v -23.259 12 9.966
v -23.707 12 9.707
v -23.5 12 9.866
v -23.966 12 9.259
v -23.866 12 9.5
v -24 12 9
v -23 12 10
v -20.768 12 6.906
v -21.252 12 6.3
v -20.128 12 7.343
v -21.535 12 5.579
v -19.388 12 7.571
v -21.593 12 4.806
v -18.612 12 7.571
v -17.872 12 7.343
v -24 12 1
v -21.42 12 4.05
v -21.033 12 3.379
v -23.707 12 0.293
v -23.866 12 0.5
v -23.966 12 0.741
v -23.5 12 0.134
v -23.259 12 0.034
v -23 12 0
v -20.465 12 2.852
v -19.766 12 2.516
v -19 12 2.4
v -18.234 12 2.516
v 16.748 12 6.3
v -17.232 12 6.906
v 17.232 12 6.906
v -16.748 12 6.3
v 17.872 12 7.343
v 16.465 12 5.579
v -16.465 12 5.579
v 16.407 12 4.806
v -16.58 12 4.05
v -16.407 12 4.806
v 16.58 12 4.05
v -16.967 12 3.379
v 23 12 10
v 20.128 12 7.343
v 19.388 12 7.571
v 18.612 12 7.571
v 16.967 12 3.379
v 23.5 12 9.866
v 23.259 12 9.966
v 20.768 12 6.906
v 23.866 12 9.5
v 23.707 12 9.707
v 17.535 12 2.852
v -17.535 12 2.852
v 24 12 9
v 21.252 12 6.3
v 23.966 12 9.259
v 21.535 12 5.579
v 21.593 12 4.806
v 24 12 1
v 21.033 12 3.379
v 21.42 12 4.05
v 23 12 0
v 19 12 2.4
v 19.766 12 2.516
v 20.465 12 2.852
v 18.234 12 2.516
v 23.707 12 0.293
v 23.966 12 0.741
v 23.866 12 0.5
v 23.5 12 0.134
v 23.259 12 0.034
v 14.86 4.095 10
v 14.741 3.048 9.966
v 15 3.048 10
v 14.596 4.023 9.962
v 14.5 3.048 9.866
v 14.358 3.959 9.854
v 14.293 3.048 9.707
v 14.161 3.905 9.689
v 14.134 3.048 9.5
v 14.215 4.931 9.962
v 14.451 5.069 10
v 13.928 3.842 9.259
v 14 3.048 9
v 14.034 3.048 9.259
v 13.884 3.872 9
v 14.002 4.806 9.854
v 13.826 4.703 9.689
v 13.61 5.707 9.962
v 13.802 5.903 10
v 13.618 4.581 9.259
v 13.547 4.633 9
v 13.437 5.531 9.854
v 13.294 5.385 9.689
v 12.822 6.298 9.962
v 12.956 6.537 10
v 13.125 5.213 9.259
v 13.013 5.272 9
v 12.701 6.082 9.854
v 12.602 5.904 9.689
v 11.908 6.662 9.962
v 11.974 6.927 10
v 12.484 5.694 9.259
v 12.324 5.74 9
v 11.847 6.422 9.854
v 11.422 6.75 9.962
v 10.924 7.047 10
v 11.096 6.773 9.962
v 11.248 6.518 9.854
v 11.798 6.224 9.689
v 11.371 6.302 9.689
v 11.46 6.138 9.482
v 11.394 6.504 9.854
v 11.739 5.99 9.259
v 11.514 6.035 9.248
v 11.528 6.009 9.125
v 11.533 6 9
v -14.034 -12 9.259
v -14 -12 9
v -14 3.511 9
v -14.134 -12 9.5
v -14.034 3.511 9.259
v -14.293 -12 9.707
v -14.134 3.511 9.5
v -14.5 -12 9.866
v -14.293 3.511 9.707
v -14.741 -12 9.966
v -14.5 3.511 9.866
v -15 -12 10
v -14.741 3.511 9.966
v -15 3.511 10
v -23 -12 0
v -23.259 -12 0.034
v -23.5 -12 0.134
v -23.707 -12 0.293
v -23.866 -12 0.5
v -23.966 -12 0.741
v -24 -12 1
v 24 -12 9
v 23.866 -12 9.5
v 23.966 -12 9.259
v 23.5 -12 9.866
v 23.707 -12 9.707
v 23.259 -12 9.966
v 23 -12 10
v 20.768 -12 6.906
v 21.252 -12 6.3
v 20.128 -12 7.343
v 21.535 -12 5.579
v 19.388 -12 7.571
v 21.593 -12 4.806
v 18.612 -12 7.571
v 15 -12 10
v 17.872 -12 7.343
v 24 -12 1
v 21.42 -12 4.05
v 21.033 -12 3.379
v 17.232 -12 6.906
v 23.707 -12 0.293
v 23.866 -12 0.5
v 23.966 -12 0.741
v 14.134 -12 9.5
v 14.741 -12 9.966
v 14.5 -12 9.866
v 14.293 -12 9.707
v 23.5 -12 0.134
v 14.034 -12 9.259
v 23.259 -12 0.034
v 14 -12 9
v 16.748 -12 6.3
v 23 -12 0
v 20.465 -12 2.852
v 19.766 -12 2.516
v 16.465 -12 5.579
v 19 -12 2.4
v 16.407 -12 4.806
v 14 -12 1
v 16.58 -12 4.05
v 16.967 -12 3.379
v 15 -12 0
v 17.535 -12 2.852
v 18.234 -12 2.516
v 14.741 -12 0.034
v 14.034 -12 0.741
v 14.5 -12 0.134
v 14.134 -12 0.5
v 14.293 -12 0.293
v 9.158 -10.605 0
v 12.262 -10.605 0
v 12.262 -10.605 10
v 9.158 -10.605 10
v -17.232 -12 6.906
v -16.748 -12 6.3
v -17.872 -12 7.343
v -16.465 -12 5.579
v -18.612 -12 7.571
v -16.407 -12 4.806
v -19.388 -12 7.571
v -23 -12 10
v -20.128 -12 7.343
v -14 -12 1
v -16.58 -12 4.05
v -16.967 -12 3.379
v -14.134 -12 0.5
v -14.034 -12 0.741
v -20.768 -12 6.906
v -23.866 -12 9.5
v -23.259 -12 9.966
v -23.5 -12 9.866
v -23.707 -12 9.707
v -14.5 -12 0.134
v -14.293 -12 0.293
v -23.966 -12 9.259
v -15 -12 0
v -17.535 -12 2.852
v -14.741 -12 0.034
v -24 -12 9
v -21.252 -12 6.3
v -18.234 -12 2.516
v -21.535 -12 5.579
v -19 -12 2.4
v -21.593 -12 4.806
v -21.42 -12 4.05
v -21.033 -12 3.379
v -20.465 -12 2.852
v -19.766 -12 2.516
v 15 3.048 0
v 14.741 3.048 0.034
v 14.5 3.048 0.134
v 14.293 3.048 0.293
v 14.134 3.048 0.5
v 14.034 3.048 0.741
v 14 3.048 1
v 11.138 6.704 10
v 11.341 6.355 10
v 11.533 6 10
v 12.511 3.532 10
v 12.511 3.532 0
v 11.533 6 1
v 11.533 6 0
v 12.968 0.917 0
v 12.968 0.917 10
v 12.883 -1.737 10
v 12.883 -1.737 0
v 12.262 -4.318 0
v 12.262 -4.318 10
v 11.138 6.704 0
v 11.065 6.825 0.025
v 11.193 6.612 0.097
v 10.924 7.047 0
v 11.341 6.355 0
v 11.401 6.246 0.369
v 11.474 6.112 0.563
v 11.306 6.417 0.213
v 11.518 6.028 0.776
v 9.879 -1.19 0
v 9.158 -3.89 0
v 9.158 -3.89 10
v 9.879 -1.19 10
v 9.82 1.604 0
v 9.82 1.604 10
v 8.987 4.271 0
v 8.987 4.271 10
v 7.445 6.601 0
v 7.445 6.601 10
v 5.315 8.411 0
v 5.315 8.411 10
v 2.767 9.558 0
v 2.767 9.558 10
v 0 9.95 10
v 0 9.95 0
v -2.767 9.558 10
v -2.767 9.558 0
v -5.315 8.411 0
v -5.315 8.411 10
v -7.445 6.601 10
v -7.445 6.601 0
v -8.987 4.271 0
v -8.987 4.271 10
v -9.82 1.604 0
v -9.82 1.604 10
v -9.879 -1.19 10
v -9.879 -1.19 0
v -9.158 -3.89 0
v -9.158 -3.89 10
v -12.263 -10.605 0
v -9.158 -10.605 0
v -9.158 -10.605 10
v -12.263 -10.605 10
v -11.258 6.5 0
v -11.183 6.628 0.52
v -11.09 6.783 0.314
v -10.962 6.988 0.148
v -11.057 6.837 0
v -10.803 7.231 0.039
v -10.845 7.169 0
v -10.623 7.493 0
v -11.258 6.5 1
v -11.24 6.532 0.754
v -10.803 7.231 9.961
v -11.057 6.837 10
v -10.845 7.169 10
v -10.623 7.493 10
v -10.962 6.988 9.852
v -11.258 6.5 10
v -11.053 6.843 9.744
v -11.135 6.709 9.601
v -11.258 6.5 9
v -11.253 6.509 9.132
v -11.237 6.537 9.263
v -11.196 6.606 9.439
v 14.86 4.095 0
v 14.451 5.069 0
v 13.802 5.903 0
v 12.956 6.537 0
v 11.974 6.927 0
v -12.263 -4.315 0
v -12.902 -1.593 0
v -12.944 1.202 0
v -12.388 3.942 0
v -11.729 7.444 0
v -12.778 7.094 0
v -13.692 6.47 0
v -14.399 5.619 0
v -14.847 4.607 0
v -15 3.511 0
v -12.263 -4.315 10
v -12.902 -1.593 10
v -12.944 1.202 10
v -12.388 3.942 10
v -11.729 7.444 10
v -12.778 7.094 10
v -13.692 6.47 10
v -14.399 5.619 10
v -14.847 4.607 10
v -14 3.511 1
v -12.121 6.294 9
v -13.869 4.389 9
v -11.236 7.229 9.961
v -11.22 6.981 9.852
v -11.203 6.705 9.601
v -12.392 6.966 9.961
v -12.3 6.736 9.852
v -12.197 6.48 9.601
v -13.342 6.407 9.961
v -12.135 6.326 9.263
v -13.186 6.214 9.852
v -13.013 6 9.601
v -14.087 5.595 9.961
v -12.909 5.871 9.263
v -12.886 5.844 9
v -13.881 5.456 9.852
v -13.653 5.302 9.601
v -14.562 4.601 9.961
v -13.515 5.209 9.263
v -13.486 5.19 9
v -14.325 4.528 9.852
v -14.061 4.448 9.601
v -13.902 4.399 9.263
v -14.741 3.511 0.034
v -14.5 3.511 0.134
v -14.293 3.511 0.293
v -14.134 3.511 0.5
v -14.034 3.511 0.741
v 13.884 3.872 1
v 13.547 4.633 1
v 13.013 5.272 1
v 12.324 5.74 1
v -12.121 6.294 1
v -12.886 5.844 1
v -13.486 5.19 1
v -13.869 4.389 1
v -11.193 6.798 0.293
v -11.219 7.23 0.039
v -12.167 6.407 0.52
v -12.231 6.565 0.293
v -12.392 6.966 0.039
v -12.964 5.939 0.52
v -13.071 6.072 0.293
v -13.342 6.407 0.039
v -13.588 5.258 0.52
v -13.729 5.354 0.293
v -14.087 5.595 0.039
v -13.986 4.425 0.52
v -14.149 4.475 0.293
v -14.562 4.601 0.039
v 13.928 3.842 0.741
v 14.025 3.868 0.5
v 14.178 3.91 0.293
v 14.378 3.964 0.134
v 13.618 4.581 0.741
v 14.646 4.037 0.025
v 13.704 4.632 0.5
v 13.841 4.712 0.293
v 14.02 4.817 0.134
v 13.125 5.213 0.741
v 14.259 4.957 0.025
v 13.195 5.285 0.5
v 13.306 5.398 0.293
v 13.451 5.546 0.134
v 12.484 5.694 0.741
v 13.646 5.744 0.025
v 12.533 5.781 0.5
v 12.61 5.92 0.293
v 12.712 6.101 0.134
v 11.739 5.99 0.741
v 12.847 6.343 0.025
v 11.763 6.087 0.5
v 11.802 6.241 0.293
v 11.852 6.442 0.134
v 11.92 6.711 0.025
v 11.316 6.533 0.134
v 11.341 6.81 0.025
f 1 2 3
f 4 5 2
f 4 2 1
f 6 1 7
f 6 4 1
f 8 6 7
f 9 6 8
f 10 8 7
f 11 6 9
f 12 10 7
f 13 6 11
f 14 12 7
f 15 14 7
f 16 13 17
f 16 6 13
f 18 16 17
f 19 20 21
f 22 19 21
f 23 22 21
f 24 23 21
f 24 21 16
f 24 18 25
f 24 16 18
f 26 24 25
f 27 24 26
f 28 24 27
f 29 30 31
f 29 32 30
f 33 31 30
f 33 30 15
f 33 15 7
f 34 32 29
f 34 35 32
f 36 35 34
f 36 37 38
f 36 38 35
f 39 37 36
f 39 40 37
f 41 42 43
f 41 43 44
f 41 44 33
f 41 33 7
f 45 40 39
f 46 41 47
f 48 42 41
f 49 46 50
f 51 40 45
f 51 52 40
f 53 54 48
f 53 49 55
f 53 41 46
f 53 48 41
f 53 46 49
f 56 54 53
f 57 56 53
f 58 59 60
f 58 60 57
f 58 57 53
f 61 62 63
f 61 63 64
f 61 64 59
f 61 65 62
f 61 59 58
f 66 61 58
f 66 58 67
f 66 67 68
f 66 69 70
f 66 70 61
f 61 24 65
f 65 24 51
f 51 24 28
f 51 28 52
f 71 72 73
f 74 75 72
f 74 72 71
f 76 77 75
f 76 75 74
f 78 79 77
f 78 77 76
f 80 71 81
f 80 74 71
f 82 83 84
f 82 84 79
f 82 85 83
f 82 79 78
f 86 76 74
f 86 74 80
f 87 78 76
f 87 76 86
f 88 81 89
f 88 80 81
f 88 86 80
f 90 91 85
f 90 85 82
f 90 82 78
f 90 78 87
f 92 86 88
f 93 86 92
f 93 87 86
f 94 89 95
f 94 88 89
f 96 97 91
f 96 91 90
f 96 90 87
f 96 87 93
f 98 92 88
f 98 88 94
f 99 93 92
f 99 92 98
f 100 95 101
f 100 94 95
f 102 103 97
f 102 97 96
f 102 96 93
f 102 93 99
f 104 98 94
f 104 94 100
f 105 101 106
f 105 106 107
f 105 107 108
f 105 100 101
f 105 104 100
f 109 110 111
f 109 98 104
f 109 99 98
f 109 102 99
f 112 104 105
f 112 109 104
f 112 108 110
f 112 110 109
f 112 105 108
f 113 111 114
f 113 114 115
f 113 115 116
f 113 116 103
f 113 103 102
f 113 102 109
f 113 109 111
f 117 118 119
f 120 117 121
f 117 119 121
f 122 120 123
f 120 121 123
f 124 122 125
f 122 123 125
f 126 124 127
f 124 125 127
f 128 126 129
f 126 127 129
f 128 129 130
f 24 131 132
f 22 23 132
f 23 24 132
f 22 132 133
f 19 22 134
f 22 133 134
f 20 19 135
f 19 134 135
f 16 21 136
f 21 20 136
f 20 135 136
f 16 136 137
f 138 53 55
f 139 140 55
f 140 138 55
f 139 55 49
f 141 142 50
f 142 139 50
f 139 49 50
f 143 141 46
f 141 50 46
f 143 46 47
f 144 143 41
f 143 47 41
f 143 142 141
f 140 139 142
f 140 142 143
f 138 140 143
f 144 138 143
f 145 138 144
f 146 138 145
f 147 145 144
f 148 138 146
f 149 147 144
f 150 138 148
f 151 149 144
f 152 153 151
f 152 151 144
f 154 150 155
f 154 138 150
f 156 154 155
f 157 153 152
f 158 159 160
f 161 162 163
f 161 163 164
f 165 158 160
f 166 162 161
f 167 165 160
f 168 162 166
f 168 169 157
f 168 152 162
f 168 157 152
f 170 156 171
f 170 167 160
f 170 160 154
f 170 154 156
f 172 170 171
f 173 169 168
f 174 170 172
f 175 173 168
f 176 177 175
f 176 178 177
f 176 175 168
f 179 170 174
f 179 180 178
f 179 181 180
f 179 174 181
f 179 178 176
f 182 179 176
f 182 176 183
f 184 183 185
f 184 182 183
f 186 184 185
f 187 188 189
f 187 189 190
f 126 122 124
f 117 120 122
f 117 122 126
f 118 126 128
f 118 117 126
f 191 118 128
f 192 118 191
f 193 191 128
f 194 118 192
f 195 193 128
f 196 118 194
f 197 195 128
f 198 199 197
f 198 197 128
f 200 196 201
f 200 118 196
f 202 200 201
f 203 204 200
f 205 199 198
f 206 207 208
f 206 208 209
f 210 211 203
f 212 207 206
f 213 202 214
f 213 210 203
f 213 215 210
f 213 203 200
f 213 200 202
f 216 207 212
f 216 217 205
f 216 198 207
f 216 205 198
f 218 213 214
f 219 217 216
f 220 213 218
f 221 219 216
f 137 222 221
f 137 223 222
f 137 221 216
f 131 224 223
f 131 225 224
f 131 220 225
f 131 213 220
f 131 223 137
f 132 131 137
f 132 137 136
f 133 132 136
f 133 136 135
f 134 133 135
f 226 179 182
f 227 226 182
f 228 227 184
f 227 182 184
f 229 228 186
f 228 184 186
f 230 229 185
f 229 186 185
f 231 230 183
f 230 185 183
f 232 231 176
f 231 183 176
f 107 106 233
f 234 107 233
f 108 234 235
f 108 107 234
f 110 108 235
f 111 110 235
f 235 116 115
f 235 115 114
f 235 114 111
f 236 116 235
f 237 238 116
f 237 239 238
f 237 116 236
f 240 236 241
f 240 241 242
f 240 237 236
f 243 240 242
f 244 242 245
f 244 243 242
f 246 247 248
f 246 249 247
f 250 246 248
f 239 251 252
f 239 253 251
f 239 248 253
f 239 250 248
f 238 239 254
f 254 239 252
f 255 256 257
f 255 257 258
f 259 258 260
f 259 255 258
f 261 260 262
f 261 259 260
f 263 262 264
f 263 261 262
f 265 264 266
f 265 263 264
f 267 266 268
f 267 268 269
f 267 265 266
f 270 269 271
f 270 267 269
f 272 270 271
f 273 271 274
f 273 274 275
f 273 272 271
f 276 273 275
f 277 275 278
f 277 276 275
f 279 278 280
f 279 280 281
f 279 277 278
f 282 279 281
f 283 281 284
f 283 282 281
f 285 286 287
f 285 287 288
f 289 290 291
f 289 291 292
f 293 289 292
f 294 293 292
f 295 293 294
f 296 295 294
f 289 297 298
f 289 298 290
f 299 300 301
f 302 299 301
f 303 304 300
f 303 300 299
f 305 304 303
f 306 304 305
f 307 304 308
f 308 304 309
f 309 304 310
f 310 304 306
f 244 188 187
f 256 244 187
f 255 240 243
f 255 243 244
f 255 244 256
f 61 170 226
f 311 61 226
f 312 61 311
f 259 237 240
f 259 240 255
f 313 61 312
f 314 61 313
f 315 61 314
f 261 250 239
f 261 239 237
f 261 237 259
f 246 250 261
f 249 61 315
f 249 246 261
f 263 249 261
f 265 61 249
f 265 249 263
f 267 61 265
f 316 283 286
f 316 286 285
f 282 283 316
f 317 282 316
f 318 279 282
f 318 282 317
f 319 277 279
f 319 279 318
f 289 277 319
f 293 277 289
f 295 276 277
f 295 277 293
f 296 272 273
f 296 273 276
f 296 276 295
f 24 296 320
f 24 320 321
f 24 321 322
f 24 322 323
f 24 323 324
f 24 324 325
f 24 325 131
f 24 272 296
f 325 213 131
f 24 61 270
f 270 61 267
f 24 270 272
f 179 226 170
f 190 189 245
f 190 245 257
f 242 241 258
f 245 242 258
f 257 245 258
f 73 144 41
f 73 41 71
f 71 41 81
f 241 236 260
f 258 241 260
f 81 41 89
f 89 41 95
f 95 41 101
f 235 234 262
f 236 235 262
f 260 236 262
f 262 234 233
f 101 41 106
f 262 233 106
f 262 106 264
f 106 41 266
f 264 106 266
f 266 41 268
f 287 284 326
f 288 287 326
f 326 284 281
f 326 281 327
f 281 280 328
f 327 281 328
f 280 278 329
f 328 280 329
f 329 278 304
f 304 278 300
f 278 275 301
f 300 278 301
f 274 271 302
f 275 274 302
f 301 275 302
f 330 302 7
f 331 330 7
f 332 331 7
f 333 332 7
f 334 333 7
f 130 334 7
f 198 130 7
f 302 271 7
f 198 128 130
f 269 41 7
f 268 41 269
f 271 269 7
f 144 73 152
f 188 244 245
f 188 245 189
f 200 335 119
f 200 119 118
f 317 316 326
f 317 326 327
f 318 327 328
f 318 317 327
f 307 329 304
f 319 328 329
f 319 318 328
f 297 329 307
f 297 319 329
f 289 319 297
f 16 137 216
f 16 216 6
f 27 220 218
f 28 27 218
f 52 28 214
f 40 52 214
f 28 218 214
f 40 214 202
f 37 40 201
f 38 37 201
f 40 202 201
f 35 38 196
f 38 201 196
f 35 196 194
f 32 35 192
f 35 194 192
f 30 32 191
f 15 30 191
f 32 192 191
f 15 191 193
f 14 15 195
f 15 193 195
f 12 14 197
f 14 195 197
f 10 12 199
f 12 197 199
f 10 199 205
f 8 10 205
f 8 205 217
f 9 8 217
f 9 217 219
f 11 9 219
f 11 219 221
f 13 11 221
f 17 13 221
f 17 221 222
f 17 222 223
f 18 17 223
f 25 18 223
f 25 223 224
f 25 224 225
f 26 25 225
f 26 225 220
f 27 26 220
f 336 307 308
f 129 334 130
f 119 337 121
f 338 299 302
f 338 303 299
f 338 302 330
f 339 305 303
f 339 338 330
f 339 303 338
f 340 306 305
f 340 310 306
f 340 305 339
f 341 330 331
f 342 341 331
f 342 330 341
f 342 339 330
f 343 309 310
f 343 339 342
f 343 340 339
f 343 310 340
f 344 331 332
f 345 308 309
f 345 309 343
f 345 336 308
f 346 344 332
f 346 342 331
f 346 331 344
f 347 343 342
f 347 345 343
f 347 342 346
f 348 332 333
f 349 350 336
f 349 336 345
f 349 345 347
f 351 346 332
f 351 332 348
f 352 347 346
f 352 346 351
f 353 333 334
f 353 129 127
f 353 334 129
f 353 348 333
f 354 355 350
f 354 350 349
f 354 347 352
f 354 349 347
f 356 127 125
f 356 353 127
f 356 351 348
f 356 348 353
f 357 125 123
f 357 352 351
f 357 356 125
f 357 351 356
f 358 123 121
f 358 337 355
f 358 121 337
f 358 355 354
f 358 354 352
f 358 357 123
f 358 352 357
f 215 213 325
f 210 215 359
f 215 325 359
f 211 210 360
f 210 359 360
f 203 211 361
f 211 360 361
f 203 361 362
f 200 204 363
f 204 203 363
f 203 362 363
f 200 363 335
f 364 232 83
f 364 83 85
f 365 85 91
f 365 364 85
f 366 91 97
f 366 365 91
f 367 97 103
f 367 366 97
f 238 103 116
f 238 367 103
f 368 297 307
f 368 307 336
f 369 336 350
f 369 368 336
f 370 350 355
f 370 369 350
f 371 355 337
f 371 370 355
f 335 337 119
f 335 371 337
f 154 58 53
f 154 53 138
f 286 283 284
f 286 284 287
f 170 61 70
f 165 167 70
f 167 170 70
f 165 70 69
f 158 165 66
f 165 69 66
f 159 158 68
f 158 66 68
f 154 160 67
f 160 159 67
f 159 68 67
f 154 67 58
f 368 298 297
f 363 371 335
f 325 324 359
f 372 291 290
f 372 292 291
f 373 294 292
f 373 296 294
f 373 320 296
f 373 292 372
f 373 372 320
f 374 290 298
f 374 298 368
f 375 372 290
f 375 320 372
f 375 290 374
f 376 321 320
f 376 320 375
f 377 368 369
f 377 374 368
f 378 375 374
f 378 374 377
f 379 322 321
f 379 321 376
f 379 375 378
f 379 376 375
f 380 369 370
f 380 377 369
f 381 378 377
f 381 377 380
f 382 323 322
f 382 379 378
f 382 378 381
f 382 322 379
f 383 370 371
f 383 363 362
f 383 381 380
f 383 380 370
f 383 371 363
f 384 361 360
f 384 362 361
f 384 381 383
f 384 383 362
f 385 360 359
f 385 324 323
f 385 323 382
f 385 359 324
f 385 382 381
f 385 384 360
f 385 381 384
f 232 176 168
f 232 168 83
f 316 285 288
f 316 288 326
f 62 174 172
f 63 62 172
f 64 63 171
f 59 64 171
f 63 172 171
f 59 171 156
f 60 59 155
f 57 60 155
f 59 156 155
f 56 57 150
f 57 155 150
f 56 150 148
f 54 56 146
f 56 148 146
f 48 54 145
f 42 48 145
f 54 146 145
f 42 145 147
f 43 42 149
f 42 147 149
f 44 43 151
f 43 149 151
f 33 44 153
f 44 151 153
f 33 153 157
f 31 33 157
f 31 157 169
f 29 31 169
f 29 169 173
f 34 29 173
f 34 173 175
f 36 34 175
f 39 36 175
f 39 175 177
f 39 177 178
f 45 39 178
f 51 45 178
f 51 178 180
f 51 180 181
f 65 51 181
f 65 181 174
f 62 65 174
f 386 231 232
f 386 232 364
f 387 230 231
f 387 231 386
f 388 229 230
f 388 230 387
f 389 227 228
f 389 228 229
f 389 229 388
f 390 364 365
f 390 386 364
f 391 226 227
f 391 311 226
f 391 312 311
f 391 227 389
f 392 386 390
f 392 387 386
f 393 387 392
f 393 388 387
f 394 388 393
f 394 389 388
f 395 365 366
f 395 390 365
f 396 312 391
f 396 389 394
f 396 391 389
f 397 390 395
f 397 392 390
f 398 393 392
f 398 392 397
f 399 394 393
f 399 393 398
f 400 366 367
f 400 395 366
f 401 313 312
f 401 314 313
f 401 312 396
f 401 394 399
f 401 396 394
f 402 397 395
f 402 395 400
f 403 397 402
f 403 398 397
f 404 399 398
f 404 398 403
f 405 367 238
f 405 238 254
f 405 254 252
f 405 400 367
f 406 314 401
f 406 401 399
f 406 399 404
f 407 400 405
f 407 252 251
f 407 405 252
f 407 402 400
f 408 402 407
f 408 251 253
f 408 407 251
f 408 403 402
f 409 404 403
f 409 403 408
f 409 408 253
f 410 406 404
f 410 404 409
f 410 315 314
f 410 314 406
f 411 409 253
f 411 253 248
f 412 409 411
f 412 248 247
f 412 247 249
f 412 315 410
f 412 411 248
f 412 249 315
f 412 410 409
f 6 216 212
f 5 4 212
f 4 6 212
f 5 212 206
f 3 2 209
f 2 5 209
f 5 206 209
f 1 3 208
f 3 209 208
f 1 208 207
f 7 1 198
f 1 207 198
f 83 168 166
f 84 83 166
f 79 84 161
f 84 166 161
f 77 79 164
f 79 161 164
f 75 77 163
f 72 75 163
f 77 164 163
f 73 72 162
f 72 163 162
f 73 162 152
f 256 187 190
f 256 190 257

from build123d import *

# Parameters (mm, degrees)
BOSS_EXTRUDE1_DEPTH = 10
FILLET1_R           = 3
SKETCH2_R           = 2.6
CUT_EXTRUDE1_DEPTH  = 36.383612026
FILLET2_R           = 1


with BuildPart() as part:
    # Sketch1 → Boss-Extrude1 (new body)
    with BuildSketch(Plane.XY):
        with BuildLine():
            Line((-11.258330249, 6.5), (-14, 6.5))
            Line((-14, 6.5), (-14, -12))
            Line((-14, -12), (-24, -12))
            Line((-24, -12), (-24, 12))
            Line((-24, 12), (24, 12))
            Line((24, 12), (24, -12))
            Line((24, -12), (14, -12))
            Line((14, -12), (14, 6))
            Line((14, 6), (11.532562595, 6))
            ThreePointArc((11.532562595, 6), (12.967632791, 0.916787763), (12.262009764, -4.317767543))
            Line((12.262009764, -4.317767543), (12.262009764, -7.605344152))
            Line((12.262009764, -7.605344152), (12.262009764, -10.605344152))
            Line((12.262009764, -10.605344152), (9.157960199, -10.605344152))
            Line((9.157960199, -10.605344152), (9.157960199, -3.890278267))
            ThreePointArc((9.157960199, -3.890278267), (0, 9.95), (-9.157960199, -3.890278267))
            Line((-9.157960199, -3.890278267), (-9.157960199, -10.605344152))
            Line((-9.157960199, -10.605344152), (-12.262862833, -10.605344152))
            Line((-12.262862833, -10.605344152), (-12.262862833, -7.605344152))
            Line((-12.262862833, -7.605344152), (-12.262862833, -4.315344152))
            ThreePointArc((-12.262862833, -4.315344152), (-12.944286318, 1.202269405), (-11.258330249, 6.5))
        make_face()
    extrude(amount=BOSS_EXTRUDE1_DEPTH)

    # Fillet1
    # the kernel refuses this fillet: 3 mm, written as the material it adds along each edge
    with BuildSketch(Plane(origin=(14, 6, 0), x_dir=(-1, 0, 0), z_dir=(0, 0, 1))) as fillet1_piece_1:
        with BuildLine():
            CenterArc((3, 2.952351111), FILLET1_R, 180, 79.774609626)
            Line((0, 2.952351111), (-0.06, 2.952351111))
            Line((-0.06, 2.952351111), (-0.06, 0))
            Line((-0.06, 0), (0, -0.06))
            ThreePointArc((0, -0.06), (1.233718703, -0.06), (2.456786153, -0.059047022))
            Line((2.456786153, -0.059047022), (2.467437405, 0))
        make_face()
    extrude(amount=10)
    with BuildSketch(Plane(origin=(-14, 6.5, 0), x_dir=(1, 0, 0), z_dir=(0, 0, 1))) as fillet1_piece_2:
        with BuildLine():
            CenterArc((3, -2.988856886), FILLET1_R, 94.93986201, 85.06013799)
            Line((0, -2.988856886), (-0.06, -2.988856886))
            Line((-0.06, -2.988856886), (-0.06, 0))
            Line((-0.06, 0), (0, 0.06))
            ThreePointArc((0, 0.06), (1.370834875, 0.06), (2.736503146, 0.059777138))
            Line((2.736503146, 0.059777138), (2.741669751, 0))
        make_face()
    extrude(amount=10)

    # Sketch2 → Cut-Extrude1 (cut, through all)
    with BuildSketch(Plane.XZ.offset(12)):
        with Locations(Location((-19, 5, 0), (0, 0, 270))):
            Circle(SKETCH2_R)
        with Locations(Location((19, 5, 0), (0, 0, 270))):
            Circle(SKETCH2_R)
    extrude(amount=-CUT_EXTRUDE1_DEPTH, mode=Mode.SUBTRACT)

    # Fillet2
    # the kernel refuses this fillet: 1 mm, written as the material it takes off along each edge
    with BuildSketch(Plane(origin=(-24, -14.5, 0), x_dir=(1, 0, 0), z_dir=(0, 1, 0)), Plane(origin=(24, 14.5, 0), x_dir=(-1, 0, 0), z_dir=(0, -1, 0))) as fillet2_piece_1:
        with BuildLine():
            CenterArc((FILLET2_R, -FILLET2_R), FILLET2_R, 90, 90)
            Line((0, -FILLET2_R), (0, 0))
            Line((0, 0), (FILLET2_R, 0))
        make_face()
    extrude(amount=29, mode=Mode.SUBTRACT)
    with BuildSketch(Plane(origin=(14, -14.5, 0), x_dir=(1, 0, 0), z_dir=(0, 1, 0))) as fillet2_piece_2:
        with BuildLine():
            CenterArc((FILLET2_R, -FILLET2_R), FILLET2_R, 90, 90)
            Line((0, -FILLET2_R), (0, 0))
            Line((0, 0), (FILLET2_R, 0))
        make_face()
    extrude(amount=17.547648889, mode=Mode.SUBTRACT)
    with BuildSketch(Plane(origin=(14, -14.5, 10), x_dir=(1, 0, 0), z_dir=(0, 1, 0))) as fillet2_piece_3:
        with BuildLine():
            CenterArc((FILLET2_R, FILLET2_R), FILLET2_R, 180, 90)
            Line((0, FILLET2_R), (0, 0))
            Line((0, 0), (FILLET2_R, 0))
        make_face()
    extrude(amount=17.547648889, mode=Mode.SUBTRACT)
    with BuildSketch(Plane(origin=(-14, 3.511143114, 0), x_dir=(0, 0, 1), z_dir=(0, -1, 0))) as fillet2_piece_4:
        with BuildLine():
            CenterArc((FILLET2_R, FILLET2_R), FILLET2_R, 180, 90)
            Line((0, FILLET2_R), (0, 0))
            Line((0, 0), (FILLET2_R, 0))
        make_face()
    extrude(amount=18.011143114, mode=Mode.SUBTRACT)
    with BuildSketch(Plane(origin=(-14, 3.511143114, 10), x_dir=(0, 0, -1), z_dir=(0, -1, 0))) as fillet2_piece_5:
        with BuildLine():
            CenterArc((FILLET2_R, -FILLET2_R), FILLET2_R, 90, 90)
            Line((0, -FILLET2_R), (0, 0))
            Line((0, 0), (FILLET2_R, 0))
        make_face()
    extrude(amount=18.011143114, mode=Mode.SUBTRACT)
    with BuildSketch(Plane(origin=(11, 3.047648889, 0), x_dir=(1, 0, 0), z_dir=(0, -1, 0))) as fillet2_piece_6_section:
        with BuildLine():
            CenterArc((3 + FILLET2_R, FILLET2_R), FILLET2_R, 180, 90)
            Line((3, FILLET2_R), (3, 0))
            Line((3, 0), (3 + FILLET2_R, 0))
        make_face()
    fillet2_piece_6 = revolve(axis=Axis((11, 3.047648889, 0), (0, 0, 1)), revolution_arc=127.536161061, mode=Mode.PRIVATE)
    fillet2_piece_6 = fillet2_piece_6 - Plane(origin=(0, 0, 0.285399127), x_dir=(0.8871201995900612, 0.46153846153846184, 0), z_dir=(0, 0, -1)) * Cylinder(13, 16, mode=Mode.PRIVATE)
    add(fillet2_piece_6, mode=Mode.SUBTRACT)
    with BuildSketch(Plane(origin=(11, 3.047648889, 10), x_dir=(1, 0, 0), z_dir=(0, -1, 0))) as fillet2_piece_7_section:
        with BuildLine():
            CenterArc((3 + FILLET2_R, -FILLET2_R), FILLET2_R, 90, 90)
            Line((3, -FILLET2_R), (3, 0))
            Line((3, 0), (3 + FILLET2_R, 0))
        make_face()
    fillet2_piece_7 = revolve(axis=Axis((11, 3.047648889, 10), (0, 0, 1)), revolution_arc=127.536161061, mode=Mode.PRIVATE)
    fillet2_piece_7 = fillet2_piece_7 - Plane(origin=(0, 0, 9.714600873), x_dir=(0.8871201995900612, 0.46153846153846184, 0), z_dir=(0, 0, -1)) * Cylinder(13, 16, mode=Mode.PRIVATE)
    add(fillet2_piece_7, mode=Mode.SUBTRACT)
    with BuildSketch(Plane(origin=(-11, 3.511143114, 0), x_dir=(0.6797454248064234, 0.7334481286735518, 0), z_dir=(0.7334481286735518, -0.6797454248064234, 0))) as fillet2_piece_8_section:
        with BuildLine():
            CenterArc((3 + FILLET2_R, FILLET2_R), FILLET2_R, 180, 90)
            Line((3 + FILLET2_R, 0), (3, 0))
            Line((3, 0), (3, FILLET2_R))
        make_face()
    fillet2_piece_8 = revolve(axis=Axis((-11, 3.511143114, 0), (0, 0, 1)), revolution_arc=132.823752842, mode=Mode.PRIVATE)
    fillet2_piece_8 = fillet2_piece_8 - Plane(origin=(0, 0, 0.285251349), x_dir=(-0.9432971409738413, -0.3319495501285957, 0), z_dir=(0, 0, -1)) * Cylinder(13, 17, mode=Mode.PRIVATE)
    add(fillet2_piece_8, mode=Mode.SUBTRACT)
    with BuildSketch(Plane(origin=(-11, 3.511143114, 10), x_dir=(0.6797454248064234, 0.7334481286735518, 0), z_dir=(0.7334481286735518, -0.6797454248064234, 0))) as fillet2_piece_9_section:
        with BuildLine():
            CenterArc((3 + FILLET2_R, -FILLET2_R), FILLET2_R, 90, 90)
            Line((3 + FILLET2_R, 0), (3, 0))
            Line((3, 0), (3, -FILLET2_R))
        make_face()
    fillet2_piece_9 = revolve(axis=Axis((-11, 3.511143114, 10), (0, 0, 1)), revolution_arc=132.823752842, mode=Mode.PRIVATE)
    fillet2_piece_9 = fillet2_piece_9 - Plane(origin=(0, 0, 9.714748651), x_dir=(-0.9432971409738413, -0.3319495501285957, 0), z_dir=(0, 0, -1)) * Cylinder(13, 17, mode=Mode.PRIVATE)
    add(fillet2_piece_9, mode=Mode.SUBTRACT)
    with BuildSketch(Plane(origin=(24, 14.5, 10), x_dir=(-1, 0, 0), z_dir=(0, -1, 0)), Plane(origin=(-24, -14.5, 10), x_dir=(1, 0, 0), z_dir=(0, 1, 0))) as fillet2_piece_10:
        with BuildLine():
            CenterArc((FILLET2_R, FILLET2_R), FILLET2_R, 180, 90)
            Line((0, FILLET2_R), (0, 0))
            Line((0, 0), (FILLET2_R, 0))
        make_face()
    extrude(amount=29, mode=Mode.SUBTRACT)


solid = part.part
